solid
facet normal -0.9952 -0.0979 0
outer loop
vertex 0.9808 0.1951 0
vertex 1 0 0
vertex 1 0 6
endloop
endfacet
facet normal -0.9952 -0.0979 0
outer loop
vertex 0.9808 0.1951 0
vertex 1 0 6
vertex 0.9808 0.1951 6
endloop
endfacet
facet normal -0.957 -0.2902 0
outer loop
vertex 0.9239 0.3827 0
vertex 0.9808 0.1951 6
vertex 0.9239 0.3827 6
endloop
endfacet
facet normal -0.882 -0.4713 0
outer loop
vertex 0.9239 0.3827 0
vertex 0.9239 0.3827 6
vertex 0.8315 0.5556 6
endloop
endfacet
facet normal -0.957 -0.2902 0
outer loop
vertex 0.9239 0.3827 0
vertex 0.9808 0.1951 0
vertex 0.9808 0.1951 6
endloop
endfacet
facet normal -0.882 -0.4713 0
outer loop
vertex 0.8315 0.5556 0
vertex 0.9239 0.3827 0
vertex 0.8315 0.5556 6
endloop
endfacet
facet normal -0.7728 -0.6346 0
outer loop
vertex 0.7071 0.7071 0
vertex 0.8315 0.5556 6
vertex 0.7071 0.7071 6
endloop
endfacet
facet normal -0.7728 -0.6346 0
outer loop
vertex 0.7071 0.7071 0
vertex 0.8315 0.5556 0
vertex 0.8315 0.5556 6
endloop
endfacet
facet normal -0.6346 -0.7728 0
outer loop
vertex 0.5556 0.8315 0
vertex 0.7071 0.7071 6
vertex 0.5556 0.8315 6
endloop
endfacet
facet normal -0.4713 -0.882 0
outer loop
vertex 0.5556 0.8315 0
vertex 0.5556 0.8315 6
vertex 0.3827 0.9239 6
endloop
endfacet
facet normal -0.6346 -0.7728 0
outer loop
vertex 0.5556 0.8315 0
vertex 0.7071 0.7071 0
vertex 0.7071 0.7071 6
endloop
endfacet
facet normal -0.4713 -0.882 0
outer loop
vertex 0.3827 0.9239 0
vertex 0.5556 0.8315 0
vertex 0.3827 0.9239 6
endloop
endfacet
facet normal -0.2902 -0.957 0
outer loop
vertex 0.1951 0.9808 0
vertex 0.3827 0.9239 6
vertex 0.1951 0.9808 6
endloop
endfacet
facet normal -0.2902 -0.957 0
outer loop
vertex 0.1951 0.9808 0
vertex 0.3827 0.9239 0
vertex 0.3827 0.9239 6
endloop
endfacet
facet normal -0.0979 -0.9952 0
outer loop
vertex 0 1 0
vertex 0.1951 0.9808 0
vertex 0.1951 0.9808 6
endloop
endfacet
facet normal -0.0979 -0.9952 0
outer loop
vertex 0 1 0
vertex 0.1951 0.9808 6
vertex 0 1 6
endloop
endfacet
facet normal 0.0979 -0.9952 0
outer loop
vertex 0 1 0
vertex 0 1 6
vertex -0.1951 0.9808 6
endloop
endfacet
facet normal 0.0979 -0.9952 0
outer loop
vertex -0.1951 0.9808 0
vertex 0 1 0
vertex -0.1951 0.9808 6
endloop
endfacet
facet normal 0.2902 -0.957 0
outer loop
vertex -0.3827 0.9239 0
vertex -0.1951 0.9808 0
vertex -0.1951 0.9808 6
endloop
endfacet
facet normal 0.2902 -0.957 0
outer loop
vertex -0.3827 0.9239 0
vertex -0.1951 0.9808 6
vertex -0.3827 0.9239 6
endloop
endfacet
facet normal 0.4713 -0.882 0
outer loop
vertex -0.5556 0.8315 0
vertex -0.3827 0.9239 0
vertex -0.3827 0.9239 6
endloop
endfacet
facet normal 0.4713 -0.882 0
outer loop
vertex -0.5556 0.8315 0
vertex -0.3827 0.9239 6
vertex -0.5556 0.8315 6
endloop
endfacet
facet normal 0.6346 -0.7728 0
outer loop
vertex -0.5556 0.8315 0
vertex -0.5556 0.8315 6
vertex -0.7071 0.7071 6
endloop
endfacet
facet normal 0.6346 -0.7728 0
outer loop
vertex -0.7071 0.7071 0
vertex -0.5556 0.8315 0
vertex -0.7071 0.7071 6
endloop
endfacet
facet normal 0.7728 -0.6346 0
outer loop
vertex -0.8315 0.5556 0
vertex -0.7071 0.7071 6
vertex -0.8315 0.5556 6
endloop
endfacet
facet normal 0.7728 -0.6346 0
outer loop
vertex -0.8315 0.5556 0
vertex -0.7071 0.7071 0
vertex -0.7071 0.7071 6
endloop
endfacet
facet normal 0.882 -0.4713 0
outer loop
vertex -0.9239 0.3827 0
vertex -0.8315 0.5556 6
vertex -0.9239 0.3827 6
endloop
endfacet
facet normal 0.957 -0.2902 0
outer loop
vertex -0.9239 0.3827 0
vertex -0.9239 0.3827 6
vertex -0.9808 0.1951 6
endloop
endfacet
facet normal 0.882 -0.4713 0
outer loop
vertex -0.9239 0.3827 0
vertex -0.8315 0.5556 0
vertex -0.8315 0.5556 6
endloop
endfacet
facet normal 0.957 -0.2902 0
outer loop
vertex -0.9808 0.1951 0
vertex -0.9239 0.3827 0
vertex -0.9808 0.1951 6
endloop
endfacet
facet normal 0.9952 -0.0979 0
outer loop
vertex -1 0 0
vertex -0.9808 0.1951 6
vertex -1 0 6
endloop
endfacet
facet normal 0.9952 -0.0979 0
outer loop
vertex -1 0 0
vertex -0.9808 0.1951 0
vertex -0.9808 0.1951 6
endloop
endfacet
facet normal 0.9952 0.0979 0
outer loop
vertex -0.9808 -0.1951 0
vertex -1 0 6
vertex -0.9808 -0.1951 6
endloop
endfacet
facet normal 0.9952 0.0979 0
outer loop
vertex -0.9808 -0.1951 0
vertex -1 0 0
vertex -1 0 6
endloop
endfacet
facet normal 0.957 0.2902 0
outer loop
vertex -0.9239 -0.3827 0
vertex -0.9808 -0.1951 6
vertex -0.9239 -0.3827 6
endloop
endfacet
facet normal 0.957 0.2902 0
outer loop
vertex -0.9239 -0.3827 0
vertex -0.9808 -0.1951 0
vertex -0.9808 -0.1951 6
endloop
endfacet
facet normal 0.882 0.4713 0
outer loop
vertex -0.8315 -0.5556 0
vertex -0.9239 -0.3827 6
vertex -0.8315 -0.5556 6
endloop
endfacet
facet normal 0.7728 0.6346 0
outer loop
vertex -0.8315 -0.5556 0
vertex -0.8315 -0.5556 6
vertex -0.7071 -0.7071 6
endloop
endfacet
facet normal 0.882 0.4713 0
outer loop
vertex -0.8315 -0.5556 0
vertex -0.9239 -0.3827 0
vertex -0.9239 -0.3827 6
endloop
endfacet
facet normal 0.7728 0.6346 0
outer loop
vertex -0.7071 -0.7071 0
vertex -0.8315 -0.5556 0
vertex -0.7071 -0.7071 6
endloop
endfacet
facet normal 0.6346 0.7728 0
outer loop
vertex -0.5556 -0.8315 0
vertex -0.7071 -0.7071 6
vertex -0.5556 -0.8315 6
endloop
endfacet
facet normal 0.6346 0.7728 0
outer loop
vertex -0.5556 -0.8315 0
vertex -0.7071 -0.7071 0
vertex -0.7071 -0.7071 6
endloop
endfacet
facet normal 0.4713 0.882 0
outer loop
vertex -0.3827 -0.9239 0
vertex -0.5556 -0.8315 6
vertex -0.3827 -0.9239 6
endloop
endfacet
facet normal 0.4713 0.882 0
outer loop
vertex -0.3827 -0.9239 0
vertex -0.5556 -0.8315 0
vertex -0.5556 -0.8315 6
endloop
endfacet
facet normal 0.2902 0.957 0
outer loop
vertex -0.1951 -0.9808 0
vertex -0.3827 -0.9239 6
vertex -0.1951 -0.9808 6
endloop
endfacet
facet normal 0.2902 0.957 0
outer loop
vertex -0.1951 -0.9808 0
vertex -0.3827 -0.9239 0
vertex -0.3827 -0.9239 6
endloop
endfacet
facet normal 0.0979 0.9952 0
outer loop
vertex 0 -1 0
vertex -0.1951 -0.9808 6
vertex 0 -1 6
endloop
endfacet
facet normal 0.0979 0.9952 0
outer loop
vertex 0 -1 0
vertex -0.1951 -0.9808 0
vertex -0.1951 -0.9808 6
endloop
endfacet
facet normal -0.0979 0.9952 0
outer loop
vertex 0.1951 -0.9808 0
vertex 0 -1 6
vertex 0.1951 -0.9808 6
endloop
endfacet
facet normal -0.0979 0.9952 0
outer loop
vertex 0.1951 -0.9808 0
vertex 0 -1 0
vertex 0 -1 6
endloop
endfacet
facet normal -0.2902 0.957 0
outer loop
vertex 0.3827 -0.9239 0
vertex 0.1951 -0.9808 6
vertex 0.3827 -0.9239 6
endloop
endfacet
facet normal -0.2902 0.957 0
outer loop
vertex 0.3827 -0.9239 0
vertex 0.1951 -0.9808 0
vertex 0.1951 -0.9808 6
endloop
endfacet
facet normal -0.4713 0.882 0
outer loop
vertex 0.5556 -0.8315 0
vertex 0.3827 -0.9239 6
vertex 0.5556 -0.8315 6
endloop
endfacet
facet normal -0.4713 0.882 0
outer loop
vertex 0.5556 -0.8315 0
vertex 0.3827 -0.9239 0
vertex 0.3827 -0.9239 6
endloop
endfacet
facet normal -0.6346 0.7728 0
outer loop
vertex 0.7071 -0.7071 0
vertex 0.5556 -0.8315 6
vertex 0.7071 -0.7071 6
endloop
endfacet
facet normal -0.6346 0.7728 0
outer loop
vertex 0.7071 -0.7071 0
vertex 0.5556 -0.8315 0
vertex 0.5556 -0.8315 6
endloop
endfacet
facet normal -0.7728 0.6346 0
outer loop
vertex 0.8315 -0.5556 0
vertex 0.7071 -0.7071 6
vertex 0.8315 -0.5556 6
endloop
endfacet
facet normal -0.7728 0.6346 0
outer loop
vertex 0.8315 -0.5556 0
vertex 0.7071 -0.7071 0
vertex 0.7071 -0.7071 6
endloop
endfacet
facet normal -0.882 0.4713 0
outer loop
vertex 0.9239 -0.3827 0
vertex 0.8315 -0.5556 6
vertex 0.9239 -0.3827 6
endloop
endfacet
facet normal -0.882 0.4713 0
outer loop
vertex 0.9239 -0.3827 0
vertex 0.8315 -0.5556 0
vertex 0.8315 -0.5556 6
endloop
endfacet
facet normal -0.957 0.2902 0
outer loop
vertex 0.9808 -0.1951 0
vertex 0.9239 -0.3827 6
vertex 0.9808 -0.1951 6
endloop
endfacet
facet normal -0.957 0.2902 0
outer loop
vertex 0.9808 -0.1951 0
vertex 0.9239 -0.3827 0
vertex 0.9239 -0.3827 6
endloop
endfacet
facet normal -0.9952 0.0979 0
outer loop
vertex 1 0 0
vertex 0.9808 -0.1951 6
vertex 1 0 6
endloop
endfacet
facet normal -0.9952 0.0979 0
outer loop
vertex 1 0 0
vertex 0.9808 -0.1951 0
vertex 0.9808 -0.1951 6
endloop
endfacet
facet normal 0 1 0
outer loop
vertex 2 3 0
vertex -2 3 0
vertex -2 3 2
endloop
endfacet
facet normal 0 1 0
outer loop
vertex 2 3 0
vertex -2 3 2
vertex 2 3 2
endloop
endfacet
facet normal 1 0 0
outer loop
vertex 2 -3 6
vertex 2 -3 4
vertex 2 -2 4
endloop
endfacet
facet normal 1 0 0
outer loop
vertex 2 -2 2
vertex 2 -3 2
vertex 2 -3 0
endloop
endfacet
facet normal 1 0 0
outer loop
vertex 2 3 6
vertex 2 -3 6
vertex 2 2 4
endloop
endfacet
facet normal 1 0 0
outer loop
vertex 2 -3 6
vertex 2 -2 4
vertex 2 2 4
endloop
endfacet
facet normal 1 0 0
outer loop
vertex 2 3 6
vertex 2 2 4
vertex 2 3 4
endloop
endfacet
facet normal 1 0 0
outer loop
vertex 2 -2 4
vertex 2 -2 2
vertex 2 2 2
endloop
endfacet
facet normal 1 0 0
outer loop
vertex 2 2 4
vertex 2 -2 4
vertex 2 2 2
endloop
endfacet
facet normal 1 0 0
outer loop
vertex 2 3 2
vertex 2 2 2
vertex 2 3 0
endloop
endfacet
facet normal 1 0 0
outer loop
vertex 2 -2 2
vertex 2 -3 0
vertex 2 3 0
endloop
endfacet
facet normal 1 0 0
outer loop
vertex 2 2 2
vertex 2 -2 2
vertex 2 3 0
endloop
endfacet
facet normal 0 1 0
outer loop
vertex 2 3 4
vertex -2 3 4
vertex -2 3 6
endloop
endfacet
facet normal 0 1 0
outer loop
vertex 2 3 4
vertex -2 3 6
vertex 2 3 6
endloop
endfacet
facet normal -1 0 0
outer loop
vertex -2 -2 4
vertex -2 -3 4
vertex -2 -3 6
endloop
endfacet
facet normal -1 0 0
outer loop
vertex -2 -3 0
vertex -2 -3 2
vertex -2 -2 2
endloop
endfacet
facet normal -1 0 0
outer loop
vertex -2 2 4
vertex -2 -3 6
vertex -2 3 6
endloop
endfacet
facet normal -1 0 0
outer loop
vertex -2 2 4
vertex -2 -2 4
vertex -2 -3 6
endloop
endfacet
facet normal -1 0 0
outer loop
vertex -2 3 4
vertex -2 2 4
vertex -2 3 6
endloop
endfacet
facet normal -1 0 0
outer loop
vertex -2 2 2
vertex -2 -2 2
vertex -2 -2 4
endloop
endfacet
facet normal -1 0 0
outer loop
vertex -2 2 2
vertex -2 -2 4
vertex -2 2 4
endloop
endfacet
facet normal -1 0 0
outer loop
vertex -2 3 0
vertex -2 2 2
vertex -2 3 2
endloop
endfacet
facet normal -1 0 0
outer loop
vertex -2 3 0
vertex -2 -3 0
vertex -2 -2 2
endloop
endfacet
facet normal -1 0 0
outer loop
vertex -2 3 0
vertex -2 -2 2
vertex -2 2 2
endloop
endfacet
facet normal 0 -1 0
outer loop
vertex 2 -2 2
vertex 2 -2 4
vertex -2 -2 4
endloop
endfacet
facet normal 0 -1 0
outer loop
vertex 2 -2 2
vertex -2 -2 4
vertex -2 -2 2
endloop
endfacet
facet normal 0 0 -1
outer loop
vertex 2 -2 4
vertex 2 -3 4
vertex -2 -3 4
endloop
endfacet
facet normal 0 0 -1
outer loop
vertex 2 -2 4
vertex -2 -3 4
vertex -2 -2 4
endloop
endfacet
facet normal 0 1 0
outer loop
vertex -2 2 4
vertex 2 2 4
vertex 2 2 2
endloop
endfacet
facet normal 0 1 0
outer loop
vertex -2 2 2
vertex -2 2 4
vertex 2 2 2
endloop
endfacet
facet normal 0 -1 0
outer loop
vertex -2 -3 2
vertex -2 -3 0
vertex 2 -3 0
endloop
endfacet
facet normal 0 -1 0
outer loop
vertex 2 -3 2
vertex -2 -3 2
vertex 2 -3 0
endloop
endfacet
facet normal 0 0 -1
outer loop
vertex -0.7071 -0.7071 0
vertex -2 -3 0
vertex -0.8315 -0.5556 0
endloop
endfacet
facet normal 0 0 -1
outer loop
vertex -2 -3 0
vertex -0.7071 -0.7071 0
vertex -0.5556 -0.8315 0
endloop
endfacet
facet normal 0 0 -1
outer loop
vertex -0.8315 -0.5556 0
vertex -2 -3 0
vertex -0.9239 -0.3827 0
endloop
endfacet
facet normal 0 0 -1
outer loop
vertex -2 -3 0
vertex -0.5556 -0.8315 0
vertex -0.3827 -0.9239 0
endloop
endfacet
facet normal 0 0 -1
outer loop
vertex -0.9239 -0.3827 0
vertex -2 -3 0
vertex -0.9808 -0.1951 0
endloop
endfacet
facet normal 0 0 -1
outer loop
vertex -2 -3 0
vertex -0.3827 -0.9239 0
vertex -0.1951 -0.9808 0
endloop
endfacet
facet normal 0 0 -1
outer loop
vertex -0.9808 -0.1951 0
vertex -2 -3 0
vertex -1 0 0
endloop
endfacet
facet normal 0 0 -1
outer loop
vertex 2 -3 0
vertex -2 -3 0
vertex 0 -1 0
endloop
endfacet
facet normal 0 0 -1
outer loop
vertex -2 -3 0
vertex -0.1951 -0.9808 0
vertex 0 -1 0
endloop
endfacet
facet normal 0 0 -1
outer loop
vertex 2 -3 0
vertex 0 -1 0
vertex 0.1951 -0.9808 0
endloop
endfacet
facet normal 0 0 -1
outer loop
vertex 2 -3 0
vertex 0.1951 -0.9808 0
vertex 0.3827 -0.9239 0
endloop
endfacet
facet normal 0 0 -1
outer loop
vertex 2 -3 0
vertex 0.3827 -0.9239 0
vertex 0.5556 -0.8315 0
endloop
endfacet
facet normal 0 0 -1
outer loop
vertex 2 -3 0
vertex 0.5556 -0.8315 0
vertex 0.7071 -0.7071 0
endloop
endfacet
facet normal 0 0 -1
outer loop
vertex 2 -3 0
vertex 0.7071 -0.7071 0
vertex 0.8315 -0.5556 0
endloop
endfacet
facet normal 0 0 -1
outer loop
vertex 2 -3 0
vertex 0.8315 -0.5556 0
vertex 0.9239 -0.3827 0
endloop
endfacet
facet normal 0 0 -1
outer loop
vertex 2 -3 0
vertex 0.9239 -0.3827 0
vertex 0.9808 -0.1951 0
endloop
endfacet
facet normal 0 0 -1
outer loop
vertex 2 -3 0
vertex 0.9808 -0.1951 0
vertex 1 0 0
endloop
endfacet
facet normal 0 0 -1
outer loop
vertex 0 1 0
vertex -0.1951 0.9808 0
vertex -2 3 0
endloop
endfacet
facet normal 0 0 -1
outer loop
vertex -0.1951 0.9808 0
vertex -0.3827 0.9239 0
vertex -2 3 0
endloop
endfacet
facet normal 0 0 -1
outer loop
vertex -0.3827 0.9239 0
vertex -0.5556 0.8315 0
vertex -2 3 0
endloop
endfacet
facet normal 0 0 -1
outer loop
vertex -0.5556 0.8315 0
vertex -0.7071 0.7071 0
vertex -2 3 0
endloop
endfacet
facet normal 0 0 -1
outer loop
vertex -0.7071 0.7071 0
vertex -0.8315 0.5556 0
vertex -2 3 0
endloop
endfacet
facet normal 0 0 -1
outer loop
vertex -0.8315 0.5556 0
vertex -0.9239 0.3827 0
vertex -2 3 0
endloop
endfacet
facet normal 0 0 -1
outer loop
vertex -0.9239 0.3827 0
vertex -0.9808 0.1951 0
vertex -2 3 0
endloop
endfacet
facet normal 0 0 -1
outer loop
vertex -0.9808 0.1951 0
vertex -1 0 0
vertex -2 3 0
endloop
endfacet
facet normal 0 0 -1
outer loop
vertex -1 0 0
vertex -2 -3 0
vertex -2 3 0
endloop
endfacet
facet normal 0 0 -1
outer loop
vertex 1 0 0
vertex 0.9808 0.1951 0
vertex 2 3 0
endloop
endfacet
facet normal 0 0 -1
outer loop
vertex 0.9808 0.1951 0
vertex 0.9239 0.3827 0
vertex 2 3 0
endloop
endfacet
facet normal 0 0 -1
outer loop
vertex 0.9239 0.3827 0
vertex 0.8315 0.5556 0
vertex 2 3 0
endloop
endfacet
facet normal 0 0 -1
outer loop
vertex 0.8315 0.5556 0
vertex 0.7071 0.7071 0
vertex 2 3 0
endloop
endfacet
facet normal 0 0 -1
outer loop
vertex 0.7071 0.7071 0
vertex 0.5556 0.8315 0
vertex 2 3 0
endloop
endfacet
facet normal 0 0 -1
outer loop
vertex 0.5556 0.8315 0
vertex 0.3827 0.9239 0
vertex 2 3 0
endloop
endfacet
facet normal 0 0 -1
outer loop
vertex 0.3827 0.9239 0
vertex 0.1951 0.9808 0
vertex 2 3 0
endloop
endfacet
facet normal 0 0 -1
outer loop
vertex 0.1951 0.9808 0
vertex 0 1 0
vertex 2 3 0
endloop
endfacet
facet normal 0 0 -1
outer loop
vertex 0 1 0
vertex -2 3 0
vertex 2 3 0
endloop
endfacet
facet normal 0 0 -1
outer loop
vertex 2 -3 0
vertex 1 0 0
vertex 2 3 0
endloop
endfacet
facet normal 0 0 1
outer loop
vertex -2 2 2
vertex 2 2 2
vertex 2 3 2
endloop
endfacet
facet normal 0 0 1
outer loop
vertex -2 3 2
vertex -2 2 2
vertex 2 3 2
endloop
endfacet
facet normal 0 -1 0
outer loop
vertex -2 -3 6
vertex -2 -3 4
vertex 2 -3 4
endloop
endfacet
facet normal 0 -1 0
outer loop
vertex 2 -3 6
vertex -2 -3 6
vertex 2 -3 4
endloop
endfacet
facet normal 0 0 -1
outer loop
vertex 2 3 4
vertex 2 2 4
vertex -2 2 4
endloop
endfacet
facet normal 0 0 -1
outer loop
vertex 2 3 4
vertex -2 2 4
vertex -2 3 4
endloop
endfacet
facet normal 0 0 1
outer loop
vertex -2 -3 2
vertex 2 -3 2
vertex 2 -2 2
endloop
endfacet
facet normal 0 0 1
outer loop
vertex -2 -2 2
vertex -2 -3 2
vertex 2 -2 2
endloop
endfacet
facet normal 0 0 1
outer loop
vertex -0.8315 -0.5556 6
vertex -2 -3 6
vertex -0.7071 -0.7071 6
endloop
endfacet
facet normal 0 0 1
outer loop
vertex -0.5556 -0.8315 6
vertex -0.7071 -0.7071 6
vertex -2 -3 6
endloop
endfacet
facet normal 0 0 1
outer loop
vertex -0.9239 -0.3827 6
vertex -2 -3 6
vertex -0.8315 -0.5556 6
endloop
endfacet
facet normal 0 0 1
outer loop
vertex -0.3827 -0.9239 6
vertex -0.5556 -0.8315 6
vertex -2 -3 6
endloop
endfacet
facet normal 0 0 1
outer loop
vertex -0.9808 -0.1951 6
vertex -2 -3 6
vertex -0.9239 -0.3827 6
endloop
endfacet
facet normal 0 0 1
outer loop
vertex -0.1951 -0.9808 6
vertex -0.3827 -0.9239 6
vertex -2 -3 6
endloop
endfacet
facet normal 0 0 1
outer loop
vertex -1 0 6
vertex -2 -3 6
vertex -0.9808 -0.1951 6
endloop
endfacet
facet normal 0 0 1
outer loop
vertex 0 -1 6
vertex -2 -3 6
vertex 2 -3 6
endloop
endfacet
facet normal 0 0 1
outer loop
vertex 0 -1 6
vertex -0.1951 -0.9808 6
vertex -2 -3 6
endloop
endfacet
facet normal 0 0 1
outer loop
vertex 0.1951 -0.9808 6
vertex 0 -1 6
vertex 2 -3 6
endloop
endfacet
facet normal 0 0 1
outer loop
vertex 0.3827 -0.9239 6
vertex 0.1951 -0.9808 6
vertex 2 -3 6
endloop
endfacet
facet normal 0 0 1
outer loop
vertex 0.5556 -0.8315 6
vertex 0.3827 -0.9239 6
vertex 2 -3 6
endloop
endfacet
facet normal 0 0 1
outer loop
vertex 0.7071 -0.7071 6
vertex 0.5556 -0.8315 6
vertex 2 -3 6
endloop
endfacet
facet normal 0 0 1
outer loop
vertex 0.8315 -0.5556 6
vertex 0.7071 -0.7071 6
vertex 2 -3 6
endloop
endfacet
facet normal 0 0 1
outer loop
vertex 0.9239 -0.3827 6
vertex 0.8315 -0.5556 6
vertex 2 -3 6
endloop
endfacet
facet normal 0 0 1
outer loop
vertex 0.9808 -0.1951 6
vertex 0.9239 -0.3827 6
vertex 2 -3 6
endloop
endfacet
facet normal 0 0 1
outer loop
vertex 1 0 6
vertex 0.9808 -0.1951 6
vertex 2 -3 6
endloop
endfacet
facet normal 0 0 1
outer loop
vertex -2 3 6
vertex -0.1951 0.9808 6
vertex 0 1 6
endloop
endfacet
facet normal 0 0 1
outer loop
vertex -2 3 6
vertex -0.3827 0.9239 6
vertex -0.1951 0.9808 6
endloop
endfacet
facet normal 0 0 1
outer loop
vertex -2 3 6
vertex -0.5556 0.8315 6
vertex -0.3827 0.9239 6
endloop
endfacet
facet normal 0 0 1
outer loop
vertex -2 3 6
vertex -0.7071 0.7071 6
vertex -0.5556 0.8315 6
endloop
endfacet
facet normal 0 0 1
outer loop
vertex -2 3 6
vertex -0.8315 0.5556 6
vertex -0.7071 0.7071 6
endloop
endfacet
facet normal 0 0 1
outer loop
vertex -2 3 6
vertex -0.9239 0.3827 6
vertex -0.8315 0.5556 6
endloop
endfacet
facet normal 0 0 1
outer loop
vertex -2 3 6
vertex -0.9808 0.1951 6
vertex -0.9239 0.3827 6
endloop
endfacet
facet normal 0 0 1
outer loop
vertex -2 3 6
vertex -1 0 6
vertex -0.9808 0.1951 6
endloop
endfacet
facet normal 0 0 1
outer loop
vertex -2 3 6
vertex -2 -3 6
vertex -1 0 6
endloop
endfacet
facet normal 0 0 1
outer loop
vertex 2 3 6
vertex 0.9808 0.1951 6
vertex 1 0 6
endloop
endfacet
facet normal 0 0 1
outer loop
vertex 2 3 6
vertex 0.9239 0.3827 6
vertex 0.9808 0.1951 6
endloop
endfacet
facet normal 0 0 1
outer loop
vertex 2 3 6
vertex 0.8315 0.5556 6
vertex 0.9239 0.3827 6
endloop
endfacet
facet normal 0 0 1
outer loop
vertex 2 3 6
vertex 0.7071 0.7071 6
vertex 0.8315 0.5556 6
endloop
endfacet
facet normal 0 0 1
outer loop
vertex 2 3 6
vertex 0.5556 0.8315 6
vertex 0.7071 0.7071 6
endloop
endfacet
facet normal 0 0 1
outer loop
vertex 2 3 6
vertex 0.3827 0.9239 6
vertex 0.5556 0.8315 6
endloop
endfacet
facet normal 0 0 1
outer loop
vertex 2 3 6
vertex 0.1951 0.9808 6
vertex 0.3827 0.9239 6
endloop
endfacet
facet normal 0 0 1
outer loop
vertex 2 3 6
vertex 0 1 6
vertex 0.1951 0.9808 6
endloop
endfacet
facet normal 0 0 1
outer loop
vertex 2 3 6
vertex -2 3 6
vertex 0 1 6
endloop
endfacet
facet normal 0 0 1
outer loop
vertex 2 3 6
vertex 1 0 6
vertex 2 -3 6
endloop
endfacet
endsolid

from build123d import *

# Parameters (mm, degrees)
SKETCH_1_W          = 4
SKETCH_1_H          = 6
SKETCH_1_R          = 1
EXTRUDE_1_DEPTH     = 6
SKETCH_2_W          = 2
SKETCH_2_H          = 1
CUT_EXTRUDE_1_DEPTH = 8.810249676


with BuildPart() as part:
    # 草图1 → 凸台-拉伸1 (new body)
    with BuildSketch(Plane.XY):
        Rectangle(SKETCH_1_W, SKETCH_1_H)
        Circle(SKETCH_1_R, mode=Mode.SUBTRACT)
    extrude(amount=EXTRUDE_1_DEPTH)

    # 草图2 → 切除-拉伸1 (cut, through all)
    with BuildSketch(Plane(origin=(2, 0, 0), x_dir=(0, 0, -1), z_dir=(1, 0, 0))):
        with Locations((-3, 2.5)):
            Rectangle(SKETCH_2_W, SKETCH_2_H)
        with Locations((-3, -2.5)):
            Rectangle(SKETCH_2_W, SKETCH_2_H)
    extrude(amount=-CUT_EXTRUDE_1_DEPTH, mode=Mode.SUBTRACT)


solid = part.part
